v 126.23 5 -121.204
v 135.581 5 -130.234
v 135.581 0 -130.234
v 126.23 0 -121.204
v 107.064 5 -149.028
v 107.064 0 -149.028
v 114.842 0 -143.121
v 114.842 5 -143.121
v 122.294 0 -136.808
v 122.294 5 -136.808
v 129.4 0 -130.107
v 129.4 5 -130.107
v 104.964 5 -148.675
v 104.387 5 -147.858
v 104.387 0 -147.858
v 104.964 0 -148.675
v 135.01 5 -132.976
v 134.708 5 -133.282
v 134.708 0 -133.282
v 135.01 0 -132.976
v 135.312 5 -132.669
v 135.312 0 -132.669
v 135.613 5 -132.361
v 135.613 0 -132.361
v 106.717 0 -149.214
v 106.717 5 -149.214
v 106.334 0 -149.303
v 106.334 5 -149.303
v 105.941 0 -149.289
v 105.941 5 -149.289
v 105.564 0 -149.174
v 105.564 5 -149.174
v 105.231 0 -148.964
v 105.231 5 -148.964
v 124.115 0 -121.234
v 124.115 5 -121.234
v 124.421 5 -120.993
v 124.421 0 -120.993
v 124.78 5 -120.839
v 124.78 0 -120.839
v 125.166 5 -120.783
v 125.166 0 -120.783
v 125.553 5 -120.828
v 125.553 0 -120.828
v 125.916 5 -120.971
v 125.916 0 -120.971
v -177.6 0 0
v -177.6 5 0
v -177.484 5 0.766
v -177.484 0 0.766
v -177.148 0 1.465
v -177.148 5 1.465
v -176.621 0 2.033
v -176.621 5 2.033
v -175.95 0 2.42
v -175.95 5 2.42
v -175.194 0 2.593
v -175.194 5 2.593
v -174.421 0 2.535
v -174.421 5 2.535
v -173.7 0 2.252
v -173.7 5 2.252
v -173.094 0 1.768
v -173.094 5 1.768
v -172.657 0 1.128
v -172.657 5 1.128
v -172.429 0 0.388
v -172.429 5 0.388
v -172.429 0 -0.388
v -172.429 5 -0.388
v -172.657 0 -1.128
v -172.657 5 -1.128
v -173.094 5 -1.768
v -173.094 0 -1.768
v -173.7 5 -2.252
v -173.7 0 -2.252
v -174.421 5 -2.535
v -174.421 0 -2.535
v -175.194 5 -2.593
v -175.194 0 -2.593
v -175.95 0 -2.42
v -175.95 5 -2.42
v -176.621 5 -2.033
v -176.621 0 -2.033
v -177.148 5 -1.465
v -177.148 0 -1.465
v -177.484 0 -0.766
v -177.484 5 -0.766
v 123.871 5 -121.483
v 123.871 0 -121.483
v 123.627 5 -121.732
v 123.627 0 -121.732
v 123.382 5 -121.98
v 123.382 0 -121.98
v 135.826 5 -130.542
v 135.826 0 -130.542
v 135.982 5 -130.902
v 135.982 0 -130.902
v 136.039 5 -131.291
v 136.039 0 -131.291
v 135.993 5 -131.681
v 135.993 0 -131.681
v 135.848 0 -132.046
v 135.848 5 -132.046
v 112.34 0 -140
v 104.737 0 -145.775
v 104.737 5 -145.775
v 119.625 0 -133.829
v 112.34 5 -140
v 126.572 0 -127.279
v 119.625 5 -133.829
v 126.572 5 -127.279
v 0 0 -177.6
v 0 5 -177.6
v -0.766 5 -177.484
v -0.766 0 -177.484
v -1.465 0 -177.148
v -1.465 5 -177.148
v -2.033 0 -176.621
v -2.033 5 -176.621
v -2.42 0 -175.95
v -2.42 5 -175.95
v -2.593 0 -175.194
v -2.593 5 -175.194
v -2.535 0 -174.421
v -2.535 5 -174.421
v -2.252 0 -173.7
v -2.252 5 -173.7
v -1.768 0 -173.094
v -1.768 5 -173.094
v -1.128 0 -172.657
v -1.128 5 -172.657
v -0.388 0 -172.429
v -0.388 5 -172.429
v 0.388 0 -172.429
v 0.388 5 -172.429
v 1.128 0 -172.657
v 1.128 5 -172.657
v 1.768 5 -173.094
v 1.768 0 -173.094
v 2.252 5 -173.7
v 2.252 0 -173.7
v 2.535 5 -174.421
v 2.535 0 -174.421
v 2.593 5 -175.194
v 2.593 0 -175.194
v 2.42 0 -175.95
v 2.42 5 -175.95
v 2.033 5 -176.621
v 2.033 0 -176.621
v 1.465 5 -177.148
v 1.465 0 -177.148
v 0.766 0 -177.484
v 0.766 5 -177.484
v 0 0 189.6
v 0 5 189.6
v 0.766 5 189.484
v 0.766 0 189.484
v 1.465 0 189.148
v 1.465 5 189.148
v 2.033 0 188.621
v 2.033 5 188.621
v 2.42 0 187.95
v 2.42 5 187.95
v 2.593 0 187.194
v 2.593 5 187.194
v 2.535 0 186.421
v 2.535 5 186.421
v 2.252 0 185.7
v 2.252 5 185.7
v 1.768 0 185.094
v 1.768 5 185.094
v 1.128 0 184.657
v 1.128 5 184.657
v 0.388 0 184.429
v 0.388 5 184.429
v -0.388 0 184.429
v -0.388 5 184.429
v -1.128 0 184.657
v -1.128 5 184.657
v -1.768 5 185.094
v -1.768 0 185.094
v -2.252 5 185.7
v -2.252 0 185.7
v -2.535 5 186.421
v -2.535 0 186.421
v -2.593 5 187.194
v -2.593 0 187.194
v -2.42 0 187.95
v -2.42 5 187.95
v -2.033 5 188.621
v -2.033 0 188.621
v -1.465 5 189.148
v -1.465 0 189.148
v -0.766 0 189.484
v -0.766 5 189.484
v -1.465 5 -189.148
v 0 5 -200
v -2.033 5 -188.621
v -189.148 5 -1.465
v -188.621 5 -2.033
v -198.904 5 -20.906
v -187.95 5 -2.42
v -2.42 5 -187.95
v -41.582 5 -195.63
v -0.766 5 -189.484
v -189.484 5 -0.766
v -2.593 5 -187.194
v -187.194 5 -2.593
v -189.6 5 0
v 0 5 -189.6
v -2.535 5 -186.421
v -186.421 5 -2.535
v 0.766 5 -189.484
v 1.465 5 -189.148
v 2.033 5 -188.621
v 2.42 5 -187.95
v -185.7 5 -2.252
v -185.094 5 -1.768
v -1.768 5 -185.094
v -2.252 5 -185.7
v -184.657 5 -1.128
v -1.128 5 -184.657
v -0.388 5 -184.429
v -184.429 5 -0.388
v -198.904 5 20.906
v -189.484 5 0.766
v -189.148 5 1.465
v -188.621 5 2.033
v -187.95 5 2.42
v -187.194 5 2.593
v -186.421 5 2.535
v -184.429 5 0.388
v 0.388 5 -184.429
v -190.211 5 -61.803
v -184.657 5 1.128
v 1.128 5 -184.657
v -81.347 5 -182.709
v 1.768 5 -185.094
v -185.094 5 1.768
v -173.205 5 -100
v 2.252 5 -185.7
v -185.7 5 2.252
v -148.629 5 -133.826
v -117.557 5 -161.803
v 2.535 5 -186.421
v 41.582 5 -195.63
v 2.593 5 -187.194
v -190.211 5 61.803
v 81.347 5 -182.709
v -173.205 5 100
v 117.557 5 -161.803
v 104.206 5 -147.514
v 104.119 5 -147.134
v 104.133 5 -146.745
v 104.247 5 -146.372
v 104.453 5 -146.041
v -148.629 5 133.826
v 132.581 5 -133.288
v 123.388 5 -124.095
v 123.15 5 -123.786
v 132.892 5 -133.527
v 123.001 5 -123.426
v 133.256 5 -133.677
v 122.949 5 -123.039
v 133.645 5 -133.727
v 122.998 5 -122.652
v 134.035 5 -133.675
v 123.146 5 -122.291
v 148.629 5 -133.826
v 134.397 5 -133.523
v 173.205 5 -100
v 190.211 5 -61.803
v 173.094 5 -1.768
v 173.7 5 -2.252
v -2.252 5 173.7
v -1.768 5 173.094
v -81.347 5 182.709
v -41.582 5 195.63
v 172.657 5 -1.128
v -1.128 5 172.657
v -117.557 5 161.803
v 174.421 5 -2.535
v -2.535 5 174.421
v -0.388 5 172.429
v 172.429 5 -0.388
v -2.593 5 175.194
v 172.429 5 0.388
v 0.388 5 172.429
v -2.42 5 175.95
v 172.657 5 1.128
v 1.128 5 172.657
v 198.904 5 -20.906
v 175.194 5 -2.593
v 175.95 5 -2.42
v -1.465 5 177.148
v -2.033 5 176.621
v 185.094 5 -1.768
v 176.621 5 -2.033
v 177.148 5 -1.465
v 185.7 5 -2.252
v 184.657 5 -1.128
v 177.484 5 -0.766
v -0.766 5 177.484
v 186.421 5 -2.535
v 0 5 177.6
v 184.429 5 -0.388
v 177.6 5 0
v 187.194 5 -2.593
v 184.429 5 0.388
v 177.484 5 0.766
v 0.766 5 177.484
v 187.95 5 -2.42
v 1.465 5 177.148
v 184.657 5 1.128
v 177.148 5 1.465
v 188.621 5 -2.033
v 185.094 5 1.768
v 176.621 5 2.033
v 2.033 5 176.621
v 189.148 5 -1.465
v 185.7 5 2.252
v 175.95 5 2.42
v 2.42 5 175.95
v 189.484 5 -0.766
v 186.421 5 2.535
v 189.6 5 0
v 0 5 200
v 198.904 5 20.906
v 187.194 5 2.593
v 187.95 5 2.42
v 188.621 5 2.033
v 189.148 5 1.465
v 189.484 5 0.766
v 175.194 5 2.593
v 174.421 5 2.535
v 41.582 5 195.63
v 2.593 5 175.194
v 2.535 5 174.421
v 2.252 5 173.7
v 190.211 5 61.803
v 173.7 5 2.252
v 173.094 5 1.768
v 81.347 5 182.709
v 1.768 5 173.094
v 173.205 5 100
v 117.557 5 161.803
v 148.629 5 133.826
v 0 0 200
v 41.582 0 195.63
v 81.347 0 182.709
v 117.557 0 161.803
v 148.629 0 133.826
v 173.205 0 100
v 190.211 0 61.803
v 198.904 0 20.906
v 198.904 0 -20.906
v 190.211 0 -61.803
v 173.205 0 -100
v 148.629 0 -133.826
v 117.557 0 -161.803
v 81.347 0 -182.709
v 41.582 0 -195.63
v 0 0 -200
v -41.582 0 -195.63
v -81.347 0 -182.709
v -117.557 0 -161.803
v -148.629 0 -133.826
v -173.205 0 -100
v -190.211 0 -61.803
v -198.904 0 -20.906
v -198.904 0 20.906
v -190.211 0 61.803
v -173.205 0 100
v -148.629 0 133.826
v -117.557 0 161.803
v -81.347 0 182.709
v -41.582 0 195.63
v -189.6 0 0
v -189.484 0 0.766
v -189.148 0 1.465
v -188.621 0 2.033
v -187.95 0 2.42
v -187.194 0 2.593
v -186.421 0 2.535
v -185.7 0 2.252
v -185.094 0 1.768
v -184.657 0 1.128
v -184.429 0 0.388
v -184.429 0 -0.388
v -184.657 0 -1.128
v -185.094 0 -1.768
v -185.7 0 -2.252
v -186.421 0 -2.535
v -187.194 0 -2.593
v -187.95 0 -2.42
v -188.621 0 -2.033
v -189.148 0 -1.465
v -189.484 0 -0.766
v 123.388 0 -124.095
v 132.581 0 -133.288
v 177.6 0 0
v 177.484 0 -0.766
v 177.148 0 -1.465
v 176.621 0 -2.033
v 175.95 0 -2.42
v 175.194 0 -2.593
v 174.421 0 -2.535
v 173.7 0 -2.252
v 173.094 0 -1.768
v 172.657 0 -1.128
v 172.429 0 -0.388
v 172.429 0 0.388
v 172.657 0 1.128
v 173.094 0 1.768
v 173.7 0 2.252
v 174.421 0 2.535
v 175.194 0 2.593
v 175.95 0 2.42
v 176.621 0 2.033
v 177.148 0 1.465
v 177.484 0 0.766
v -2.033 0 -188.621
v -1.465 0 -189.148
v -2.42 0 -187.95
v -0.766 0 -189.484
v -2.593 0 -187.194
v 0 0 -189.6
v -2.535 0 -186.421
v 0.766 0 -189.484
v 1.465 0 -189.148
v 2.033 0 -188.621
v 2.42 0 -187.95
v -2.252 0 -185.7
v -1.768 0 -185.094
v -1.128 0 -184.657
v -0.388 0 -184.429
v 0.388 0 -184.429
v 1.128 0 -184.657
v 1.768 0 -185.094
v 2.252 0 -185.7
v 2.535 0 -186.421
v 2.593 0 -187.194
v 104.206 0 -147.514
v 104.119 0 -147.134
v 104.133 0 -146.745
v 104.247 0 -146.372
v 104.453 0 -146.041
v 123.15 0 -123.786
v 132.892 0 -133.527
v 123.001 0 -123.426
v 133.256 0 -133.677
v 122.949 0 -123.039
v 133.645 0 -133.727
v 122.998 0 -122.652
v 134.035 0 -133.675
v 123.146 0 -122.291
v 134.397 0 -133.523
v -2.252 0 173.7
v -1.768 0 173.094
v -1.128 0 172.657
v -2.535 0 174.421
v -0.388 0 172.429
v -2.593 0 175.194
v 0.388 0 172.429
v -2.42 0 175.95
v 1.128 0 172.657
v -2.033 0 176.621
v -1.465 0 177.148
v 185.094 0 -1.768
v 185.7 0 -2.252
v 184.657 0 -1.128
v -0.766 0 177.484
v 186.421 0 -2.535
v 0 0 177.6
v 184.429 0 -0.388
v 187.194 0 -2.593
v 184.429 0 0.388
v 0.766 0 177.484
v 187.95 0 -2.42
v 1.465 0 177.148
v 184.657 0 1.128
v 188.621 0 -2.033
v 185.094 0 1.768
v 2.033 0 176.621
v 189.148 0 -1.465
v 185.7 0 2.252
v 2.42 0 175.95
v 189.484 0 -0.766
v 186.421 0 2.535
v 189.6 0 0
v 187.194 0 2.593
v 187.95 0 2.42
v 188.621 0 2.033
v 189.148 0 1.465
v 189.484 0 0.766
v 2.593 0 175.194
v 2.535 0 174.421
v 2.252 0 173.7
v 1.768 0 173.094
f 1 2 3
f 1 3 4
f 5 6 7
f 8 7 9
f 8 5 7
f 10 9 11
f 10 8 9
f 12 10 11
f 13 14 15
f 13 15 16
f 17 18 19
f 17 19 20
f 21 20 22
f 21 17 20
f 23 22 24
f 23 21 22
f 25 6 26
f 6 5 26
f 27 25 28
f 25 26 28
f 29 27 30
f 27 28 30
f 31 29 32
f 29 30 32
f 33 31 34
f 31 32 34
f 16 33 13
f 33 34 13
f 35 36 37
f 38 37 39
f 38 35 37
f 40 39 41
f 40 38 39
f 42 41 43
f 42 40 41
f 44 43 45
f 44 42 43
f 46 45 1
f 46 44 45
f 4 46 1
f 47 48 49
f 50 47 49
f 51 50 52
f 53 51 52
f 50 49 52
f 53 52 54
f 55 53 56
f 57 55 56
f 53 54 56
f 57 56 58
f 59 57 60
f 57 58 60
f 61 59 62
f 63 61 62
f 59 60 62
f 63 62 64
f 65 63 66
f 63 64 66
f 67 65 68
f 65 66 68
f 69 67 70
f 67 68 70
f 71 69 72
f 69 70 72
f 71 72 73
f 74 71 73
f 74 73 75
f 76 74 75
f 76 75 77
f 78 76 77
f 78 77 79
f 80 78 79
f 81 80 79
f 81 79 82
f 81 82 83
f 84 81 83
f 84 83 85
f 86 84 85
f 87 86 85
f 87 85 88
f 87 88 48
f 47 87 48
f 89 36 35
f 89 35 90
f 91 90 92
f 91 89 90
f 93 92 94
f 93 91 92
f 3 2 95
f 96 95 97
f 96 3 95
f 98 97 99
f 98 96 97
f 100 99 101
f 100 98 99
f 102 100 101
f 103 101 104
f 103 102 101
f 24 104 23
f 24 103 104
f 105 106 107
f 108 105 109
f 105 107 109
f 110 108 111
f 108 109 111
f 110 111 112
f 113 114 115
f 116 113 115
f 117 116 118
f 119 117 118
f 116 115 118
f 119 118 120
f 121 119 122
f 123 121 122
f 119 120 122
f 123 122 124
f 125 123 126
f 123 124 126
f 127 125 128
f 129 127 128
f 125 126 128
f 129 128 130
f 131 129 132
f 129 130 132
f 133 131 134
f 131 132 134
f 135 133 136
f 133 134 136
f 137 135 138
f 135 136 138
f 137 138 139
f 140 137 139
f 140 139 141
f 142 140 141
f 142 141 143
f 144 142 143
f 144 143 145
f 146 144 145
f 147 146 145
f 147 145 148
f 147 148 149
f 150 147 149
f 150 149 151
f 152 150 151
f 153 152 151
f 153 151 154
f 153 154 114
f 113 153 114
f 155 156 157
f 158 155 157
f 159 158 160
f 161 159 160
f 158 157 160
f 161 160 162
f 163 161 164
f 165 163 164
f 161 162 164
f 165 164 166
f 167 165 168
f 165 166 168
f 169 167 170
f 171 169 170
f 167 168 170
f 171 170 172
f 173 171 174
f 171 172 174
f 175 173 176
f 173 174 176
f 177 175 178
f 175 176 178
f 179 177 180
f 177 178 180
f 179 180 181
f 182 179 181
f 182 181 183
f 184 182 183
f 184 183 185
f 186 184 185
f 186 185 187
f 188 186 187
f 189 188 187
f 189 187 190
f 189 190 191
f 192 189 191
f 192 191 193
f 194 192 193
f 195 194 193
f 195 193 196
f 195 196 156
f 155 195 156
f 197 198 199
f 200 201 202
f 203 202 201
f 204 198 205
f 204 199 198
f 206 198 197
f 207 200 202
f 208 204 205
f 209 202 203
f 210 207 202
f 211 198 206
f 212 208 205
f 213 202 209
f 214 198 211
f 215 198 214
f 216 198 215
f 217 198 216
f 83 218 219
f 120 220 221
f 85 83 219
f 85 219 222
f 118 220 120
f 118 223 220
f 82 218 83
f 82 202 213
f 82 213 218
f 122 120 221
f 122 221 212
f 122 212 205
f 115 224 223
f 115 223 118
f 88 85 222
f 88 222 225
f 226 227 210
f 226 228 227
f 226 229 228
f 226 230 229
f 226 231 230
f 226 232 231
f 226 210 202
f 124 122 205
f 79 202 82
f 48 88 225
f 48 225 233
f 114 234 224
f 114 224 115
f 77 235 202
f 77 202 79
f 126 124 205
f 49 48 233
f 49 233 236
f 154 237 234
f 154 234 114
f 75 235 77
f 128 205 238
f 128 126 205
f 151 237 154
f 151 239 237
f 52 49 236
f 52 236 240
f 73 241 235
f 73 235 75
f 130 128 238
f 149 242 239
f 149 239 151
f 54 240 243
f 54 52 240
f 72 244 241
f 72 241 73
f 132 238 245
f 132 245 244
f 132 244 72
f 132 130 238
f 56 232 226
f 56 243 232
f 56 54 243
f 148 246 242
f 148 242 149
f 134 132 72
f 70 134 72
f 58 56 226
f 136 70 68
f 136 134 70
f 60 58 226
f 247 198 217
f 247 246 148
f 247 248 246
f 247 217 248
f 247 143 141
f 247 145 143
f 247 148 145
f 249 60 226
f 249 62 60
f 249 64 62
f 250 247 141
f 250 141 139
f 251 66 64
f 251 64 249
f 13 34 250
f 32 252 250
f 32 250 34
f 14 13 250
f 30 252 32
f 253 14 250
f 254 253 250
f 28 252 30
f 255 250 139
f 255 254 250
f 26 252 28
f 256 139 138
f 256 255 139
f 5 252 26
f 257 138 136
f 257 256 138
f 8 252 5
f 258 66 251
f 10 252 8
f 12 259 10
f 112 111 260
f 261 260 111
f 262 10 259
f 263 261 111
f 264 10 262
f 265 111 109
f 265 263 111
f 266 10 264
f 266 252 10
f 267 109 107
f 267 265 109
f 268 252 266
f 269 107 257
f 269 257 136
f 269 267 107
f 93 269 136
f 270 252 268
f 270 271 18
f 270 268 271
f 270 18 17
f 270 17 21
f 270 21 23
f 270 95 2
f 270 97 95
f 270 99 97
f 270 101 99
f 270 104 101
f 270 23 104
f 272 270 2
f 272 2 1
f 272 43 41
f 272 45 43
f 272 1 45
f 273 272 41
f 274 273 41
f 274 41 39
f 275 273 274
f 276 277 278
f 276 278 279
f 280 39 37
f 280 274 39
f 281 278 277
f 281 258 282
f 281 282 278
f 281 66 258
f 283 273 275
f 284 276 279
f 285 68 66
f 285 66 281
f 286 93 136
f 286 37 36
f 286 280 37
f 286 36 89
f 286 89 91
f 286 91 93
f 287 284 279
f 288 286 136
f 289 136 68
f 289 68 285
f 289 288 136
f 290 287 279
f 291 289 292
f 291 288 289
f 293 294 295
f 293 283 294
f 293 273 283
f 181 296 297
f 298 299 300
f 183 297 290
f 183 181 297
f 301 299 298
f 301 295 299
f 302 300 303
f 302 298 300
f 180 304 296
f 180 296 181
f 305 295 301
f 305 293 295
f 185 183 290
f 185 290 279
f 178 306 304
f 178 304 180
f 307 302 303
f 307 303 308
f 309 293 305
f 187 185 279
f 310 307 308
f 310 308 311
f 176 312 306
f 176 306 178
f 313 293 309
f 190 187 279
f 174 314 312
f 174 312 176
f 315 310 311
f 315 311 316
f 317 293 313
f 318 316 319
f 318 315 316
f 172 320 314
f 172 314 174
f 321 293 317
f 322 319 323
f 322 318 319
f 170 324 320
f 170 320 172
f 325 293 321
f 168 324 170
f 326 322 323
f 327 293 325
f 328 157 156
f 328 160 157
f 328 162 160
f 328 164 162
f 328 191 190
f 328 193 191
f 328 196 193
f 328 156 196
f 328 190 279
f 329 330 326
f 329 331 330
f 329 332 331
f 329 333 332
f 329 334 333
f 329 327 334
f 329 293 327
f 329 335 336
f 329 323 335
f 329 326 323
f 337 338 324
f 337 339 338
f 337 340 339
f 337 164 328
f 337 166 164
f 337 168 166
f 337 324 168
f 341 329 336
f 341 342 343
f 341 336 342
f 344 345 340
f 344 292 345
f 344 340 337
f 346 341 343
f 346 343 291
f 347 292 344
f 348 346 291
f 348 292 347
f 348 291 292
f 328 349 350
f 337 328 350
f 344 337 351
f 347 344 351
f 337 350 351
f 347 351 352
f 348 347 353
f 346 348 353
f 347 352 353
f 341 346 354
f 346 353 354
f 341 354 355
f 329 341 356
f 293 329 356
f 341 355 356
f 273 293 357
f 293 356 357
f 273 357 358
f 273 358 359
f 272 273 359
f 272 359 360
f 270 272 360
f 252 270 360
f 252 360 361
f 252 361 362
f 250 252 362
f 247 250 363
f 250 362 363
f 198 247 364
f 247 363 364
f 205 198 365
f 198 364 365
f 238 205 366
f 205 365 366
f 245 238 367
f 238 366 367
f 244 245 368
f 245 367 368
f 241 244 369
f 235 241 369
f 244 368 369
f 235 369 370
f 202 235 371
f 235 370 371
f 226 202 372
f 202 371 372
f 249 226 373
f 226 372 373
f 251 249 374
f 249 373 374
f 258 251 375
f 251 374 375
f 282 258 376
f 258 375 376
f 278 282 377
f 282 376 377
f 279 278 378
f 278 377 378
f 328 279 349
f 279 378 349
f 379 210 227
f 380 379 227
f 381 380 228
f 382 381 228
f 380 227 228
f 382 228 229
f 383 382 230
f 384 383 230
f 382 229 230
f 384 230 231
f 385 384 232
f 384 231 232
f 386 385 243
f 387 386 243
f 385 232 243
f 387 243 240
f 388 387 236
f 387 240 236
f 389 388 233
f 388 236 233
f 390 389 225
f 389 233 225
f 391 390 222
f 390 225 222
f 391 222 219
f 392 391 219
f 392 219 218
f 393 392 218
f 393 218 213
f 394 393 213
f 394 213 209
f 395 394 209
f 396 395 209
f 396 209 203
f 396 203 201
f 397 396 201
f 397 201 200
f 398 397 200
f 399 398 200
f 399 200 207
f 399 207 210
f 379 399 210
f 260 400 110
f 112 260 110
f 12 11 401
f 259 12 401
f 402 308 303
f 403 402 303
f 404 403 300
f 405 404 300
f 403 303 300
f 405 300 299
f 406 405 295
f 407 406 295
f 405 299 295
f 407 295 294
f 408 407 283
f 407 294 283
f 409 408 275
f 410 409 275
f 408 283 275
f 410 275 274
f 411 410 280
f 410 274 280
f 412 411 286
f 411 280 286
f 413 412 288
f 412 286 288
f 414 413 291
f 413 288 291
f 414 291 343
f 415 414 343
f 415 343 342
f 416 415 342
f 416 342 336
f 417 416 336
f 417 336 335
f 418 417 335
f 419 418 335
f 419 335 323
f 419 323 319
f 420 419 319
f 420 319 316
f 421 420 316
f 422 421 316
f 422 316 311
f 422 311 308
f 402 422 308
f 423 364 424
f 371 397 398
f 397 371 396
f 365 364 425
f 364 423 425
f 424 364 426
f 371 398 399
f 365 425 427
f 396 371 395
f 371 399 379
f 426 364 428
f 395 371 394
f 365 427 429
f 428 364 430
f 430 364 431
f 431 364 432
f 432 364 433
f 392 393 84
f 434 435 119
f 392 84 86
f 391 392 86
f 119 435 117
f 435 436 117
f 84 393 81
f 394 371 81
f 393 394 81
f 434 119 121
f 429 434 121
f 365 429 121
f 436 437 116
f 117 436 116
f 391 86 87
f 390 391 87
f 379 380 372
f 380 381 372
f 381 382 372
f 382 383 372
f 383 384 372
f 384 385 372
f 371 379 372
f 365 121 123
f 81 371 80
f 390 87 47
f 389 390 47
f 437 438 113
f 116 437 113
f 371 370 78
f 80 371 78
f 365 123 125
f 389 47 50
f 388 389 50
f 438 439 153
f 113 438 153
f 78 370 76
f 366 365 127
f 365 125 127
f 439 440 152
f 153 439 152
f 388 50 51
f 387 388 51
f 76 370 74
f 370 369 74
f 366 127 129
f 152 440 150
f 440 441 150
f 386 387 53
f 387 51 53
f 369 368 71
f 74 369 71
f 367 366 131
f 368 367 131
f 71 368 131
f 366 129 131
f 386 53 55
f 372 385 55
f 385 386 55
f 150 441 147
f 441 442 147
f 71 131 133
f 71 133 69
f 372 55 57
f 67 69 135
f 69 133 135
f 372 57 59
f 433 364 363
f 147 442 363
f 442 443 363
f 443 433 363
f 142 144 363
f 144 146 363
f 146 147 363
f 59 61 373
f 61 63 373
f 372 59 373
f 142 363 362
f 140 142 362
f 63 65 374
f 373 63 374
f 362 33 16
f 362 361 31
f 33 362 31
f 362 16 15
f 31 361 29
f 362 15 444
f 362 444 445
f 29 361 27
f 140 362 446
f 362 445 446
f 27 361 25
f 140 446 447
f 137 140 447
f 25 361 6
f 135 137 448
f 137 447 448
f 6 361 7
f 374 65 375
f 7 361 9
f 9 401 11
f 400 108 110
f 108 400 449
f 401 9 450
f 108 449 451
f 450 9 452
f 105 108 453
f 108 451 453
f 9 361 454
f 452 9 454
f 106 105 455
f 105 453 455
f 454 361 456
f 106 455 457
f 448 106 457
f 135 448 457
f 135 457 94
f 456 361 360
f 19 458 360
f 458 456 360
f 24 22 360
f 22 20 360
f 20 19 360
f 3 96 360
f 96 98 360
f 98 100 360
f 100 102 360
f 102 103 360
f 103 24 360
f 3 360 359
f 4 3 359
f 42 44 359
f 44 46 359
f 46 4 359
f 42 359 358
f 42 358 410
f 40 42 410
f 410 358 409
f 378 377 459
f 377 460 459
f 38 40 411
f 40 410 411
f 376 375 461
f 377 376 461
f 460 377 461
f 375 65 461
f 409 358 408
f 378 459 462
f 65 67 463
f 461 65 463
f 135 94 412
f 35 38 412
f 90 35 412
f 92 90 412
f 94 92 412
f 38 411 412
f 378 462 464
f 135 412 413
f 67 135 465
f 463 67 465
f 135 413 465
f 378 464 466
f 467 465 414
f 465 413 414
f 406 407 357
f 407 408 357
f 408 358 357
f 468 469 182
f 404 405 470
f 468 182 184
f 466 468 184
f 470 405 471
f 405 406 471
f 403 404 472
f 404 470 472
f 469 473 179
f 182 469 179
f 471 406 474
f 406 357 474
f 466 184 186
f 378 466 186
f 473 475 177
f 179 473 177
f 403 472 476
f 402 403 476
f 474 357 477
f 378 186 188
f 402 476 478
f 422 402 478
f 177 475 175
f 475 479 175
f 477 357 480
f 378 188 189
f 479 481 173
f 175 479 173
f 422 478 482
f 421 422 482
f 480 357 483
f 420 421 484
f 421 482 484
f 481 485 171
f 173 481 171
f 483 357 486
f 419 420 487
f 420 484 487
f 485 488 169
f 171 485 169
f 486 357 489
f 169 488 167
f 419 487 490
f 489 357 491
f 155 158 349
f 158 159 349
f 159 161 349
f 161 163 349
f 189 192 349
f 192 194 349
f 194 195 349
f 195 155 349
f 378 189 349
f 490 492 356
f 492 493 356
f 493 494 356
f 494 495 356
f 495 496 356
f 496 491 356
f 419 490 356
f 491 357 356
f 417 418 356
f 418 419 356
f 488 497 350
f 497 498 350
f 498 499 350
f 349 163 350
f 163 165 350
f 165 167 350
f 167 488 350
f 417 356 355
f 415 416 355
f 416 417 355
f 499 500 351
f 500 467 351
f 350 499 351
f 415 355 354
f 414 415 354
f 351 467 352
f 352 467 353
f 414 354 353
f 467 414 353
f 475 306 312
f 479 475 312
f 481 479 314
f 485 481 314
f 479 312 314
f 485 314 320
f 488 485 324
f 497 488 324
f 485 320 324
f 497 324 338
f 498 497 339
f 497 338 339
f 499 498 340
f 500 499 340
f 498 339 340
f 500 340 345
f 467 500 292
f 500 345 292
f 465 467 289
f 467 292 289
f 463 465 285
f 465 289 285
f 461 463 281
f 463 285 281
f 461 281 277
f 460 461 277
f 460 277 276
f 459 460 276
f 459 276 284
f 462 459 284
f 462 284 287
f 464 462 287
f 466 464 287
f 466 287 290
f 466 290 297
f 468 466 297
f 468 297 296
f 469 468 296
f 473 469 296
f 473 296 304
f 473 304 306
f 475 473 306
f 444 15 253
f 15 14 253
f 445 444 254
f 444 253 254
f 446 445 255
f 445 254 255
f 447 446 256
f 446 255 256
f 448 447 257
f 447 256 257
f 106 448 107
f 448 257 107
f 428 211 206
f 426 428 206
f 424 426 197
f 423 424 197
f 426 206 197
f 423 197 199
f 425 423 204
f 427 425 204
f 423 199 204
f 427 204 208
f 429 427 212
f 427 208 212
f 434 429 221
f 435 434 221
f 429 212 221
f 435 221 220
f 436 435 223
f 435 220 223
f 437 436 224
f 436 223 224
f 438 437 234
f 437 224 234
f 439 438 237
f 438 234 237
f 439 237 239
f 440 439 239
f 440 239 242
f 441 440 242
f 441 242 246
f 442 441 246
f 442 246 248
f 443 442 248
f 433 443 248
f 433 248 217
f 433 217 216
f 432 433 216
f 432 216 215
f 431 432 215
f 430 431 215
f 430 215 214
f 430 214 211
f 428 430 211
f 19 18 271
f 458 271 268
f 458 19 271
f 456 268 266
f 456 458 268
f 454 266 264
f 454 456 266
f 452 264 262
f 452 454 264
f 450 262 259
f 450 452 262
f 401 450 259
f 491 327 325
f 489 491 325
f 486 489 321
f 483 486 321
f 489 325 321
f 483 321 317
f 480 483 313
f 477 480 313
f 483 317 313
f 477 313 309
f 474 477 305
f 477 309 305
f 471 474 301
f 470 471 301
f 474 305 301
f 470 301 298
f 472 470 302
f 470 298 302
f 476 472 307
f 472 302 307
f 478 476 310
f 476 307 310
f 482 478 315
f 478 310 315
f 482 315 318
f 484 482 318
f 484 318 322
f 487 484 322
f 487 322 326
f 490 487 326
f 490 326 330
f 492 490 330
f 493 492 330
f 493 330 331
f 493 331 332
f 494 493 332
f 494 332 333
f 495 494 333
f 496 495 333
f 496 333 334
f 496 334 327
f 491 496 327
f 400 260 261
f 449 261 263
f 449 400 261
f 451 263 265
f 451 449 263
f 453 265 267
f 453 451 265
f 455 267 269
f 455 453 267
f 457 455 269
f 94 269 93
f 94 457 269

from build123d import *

# Parameters (mm, degrees)
SKETCH_1_R                    = 200
EXTRUDE_251_DEPTH             = 5
CUT_EXTRUDE_3_REACH           = 284.887
SKETCH_2_R                    = 2.6
PATTERN_CIRCULAR_1_COUNT      = 4
SKETCH_4_W                    = 4
SKETCH_4_H                    = 11.5
CUT_REVOLVE_3_ANGLE           = 9.5
CUT_REVOLVE_3_OTHER_WAY_ANGLE = 0.5
FILLET_2_R                    = 1.5
CUT_EXTRUDE_1690_REACH        = 284.887
FILLET_1_R                    = 1.5


with BuildPart() as part:
    # 草图1 → Extrude 251 (new body)
    with BuildSketch(Plane(origin=(0, 0, 0), x_dir=(1, 0, 0), z_dir=(0, 1, 0))):
        Circle(SKETCH_1_R)
    extrude(amount=EXTRUDE_251_DEPTH)

    # 草图2 → 切除-拉伸3 (cut, up to next)
    with BuildSketch(Plane(origin=(0, 5, 0), x_dir=(1, 0, 0), z_dir=(0, 1, 0)), mode=Mode.PRIVATE) as cut_extrude_3_sk1:
        with Locations((0, -175)):
            Circle(SKETCH_2_R)
    cut_extrude_3_tool1 = extrude(cut_extrude_3_sk1.sketch, amount=-CUT_EXTRUDE_3_REACH, mode=Mode.PRIVATE) & part.part
    # 草图2 → 切除-拉伸3 (cut, up to next)
    with BuildSketch(Plane(origin=(0, 5, 0), x_dir=(1, 0, 0), z_dir=(0, 1, 0)), mode=Mode.PRIVATE) as cut_extrude_3_sk2:
        with Locations((0, -187)):
            Circle(SKETCH_2_R)
    cut_extrude_3_tool2 = extrude(cut_extrude_3_sk2.sketch, amount=-CUT_EXTRUDE_3_REACH, mode=Mode.PRIVATE) & part.part
    cut_extrude_3_1 = cut_extrude_3_tool1.solids().sort_by_distance((0, 5, 175))[0]
    add(cut_extrude_3_1, mode=Mode.SUBTRACT)
    cut_extrude_3_2 = cut_extrude_3_tool2.solids().sort_by_distance((0, 5, 187))[0]
    add(cut_extrude_3_2, mode=Mode.SUBTRACT)
    cut_extrude_3 = cut_extrude_3_1 + cut_extrude_3_2  # 切除-拉伸3 as one shape, for the pattern or mirror that repeats it

    # 阵列(圆周)1: 切除-拉伸3 ×4 about axis
    pattern_circular_1_axis = Axis((0, -55, 0), (0, 1, 0))
    for i in range(1, PATTERN_CIRCULAR_1_COUNT):
        add(cut_extrude_3.rotate(pattern_circular_1_axis, i * 360 / PATTERN_CIRCULAR_1_COUNT), mode=Mode.SUBTRACT)

    # 草图4 → 切除-旋转3 (revolve, cut)
    with BuildSketch(Plane(origin=(0, 0, 0), x_dir=(0.7036657529829018, 0, -0.710531145045033), z_dir=(0.710531145045033, 0, 0.7036657529829018))):
        with Locations((181.5, 5.25)):
            Rectangle(SKETCH_4_W, SKETCH_4_H)
    revolve(axis=Axis((0, -55, 0), (0, 1, 0)), revolution_arc=CUT_REVOLVE_3_ANGLE, mode=Mode.SUBTRACT)

    # 草图4 → 切除-旋转3 other way (revolve, cut)
    with BuildSketch(Plane(origin=(0, 0, 0), x_dir=(0.7036657529829018, 0, -0.710531145045033), z_dir=(0.710531145045033, 0, 0.7036657529829018))):
        with Locations((181.5, 5.25)):
            Rectangle(SKETCH_4_W, SKETCH_4_H)
    revolve(axis=Axis((0, -55, 0), (0, -1, 0)), revolution_arc=CUT_REVOLVE_3_OTHER_WAY_ANGLE, mode=Mode.SUBTRACT)

    # 圆角2
    fillet_2_edges = [part.edges().sort_by_distance(p)[0] for p in [
        (103.525536527, 2.5, -146.638034926),
        (105.832512271, 2.5, -149.905734868),
    ]]
    fillet(fillet_2_edges, radius=FILLET_2_R)

    # 草图6 → Cut-Extrude 1690 (cut, up to next)
    with BuildSketch(Plane(origin=(0, 5, 0), x_dir=(1, 0, 0), z_dir=(0, 1, 0)), mode=Mode.PRIVATE) as cut_extrude_1690_sk1:
        with BuildLine():
            Line((122.328963701, 123.036070482), (133.642715214, 134.349821995))
            ThreePointArc((133.642715214, 134.349821995), (135.160960115, 132.822305585), (136.66174685, 131.277633083))
            Line((136.66174685, 131.277633083), (125.152266287, 120.163056899))
            ThreePointArc((125.152266287, 120.163056899), (123.748952928, 121.607757356), (122.328963701, 123.036070482))
        make_face()
    cut_extrude_1690_tool1 = extrude(cut_extrude_1690_sk1.sketch, amount=-CUT_EXTRUDE_1690_REACH, mode=Mode.PRIVATE) & part.part
    add(cut_extrude_1690_tool1.solids().sort_by_distance((129.515831, 5, -127.274853))[0], mode=Mode.SUBTRACT)

    # 圆角1
    fillet_1_edges = [part.edges().sort_by_distance(p)[0] for p in [
        (125.152266287, 2.5, -120.163056899),
        (136.66174685, 2.5, -131.277633083),
        (133.642715214, 2.5, -134.349821995),
        (122.328963701, 2.5, -123.036070482),
    ]]
    fillet(fillet_1_edges, radius=FILLET_1_R)


solid = part.part
